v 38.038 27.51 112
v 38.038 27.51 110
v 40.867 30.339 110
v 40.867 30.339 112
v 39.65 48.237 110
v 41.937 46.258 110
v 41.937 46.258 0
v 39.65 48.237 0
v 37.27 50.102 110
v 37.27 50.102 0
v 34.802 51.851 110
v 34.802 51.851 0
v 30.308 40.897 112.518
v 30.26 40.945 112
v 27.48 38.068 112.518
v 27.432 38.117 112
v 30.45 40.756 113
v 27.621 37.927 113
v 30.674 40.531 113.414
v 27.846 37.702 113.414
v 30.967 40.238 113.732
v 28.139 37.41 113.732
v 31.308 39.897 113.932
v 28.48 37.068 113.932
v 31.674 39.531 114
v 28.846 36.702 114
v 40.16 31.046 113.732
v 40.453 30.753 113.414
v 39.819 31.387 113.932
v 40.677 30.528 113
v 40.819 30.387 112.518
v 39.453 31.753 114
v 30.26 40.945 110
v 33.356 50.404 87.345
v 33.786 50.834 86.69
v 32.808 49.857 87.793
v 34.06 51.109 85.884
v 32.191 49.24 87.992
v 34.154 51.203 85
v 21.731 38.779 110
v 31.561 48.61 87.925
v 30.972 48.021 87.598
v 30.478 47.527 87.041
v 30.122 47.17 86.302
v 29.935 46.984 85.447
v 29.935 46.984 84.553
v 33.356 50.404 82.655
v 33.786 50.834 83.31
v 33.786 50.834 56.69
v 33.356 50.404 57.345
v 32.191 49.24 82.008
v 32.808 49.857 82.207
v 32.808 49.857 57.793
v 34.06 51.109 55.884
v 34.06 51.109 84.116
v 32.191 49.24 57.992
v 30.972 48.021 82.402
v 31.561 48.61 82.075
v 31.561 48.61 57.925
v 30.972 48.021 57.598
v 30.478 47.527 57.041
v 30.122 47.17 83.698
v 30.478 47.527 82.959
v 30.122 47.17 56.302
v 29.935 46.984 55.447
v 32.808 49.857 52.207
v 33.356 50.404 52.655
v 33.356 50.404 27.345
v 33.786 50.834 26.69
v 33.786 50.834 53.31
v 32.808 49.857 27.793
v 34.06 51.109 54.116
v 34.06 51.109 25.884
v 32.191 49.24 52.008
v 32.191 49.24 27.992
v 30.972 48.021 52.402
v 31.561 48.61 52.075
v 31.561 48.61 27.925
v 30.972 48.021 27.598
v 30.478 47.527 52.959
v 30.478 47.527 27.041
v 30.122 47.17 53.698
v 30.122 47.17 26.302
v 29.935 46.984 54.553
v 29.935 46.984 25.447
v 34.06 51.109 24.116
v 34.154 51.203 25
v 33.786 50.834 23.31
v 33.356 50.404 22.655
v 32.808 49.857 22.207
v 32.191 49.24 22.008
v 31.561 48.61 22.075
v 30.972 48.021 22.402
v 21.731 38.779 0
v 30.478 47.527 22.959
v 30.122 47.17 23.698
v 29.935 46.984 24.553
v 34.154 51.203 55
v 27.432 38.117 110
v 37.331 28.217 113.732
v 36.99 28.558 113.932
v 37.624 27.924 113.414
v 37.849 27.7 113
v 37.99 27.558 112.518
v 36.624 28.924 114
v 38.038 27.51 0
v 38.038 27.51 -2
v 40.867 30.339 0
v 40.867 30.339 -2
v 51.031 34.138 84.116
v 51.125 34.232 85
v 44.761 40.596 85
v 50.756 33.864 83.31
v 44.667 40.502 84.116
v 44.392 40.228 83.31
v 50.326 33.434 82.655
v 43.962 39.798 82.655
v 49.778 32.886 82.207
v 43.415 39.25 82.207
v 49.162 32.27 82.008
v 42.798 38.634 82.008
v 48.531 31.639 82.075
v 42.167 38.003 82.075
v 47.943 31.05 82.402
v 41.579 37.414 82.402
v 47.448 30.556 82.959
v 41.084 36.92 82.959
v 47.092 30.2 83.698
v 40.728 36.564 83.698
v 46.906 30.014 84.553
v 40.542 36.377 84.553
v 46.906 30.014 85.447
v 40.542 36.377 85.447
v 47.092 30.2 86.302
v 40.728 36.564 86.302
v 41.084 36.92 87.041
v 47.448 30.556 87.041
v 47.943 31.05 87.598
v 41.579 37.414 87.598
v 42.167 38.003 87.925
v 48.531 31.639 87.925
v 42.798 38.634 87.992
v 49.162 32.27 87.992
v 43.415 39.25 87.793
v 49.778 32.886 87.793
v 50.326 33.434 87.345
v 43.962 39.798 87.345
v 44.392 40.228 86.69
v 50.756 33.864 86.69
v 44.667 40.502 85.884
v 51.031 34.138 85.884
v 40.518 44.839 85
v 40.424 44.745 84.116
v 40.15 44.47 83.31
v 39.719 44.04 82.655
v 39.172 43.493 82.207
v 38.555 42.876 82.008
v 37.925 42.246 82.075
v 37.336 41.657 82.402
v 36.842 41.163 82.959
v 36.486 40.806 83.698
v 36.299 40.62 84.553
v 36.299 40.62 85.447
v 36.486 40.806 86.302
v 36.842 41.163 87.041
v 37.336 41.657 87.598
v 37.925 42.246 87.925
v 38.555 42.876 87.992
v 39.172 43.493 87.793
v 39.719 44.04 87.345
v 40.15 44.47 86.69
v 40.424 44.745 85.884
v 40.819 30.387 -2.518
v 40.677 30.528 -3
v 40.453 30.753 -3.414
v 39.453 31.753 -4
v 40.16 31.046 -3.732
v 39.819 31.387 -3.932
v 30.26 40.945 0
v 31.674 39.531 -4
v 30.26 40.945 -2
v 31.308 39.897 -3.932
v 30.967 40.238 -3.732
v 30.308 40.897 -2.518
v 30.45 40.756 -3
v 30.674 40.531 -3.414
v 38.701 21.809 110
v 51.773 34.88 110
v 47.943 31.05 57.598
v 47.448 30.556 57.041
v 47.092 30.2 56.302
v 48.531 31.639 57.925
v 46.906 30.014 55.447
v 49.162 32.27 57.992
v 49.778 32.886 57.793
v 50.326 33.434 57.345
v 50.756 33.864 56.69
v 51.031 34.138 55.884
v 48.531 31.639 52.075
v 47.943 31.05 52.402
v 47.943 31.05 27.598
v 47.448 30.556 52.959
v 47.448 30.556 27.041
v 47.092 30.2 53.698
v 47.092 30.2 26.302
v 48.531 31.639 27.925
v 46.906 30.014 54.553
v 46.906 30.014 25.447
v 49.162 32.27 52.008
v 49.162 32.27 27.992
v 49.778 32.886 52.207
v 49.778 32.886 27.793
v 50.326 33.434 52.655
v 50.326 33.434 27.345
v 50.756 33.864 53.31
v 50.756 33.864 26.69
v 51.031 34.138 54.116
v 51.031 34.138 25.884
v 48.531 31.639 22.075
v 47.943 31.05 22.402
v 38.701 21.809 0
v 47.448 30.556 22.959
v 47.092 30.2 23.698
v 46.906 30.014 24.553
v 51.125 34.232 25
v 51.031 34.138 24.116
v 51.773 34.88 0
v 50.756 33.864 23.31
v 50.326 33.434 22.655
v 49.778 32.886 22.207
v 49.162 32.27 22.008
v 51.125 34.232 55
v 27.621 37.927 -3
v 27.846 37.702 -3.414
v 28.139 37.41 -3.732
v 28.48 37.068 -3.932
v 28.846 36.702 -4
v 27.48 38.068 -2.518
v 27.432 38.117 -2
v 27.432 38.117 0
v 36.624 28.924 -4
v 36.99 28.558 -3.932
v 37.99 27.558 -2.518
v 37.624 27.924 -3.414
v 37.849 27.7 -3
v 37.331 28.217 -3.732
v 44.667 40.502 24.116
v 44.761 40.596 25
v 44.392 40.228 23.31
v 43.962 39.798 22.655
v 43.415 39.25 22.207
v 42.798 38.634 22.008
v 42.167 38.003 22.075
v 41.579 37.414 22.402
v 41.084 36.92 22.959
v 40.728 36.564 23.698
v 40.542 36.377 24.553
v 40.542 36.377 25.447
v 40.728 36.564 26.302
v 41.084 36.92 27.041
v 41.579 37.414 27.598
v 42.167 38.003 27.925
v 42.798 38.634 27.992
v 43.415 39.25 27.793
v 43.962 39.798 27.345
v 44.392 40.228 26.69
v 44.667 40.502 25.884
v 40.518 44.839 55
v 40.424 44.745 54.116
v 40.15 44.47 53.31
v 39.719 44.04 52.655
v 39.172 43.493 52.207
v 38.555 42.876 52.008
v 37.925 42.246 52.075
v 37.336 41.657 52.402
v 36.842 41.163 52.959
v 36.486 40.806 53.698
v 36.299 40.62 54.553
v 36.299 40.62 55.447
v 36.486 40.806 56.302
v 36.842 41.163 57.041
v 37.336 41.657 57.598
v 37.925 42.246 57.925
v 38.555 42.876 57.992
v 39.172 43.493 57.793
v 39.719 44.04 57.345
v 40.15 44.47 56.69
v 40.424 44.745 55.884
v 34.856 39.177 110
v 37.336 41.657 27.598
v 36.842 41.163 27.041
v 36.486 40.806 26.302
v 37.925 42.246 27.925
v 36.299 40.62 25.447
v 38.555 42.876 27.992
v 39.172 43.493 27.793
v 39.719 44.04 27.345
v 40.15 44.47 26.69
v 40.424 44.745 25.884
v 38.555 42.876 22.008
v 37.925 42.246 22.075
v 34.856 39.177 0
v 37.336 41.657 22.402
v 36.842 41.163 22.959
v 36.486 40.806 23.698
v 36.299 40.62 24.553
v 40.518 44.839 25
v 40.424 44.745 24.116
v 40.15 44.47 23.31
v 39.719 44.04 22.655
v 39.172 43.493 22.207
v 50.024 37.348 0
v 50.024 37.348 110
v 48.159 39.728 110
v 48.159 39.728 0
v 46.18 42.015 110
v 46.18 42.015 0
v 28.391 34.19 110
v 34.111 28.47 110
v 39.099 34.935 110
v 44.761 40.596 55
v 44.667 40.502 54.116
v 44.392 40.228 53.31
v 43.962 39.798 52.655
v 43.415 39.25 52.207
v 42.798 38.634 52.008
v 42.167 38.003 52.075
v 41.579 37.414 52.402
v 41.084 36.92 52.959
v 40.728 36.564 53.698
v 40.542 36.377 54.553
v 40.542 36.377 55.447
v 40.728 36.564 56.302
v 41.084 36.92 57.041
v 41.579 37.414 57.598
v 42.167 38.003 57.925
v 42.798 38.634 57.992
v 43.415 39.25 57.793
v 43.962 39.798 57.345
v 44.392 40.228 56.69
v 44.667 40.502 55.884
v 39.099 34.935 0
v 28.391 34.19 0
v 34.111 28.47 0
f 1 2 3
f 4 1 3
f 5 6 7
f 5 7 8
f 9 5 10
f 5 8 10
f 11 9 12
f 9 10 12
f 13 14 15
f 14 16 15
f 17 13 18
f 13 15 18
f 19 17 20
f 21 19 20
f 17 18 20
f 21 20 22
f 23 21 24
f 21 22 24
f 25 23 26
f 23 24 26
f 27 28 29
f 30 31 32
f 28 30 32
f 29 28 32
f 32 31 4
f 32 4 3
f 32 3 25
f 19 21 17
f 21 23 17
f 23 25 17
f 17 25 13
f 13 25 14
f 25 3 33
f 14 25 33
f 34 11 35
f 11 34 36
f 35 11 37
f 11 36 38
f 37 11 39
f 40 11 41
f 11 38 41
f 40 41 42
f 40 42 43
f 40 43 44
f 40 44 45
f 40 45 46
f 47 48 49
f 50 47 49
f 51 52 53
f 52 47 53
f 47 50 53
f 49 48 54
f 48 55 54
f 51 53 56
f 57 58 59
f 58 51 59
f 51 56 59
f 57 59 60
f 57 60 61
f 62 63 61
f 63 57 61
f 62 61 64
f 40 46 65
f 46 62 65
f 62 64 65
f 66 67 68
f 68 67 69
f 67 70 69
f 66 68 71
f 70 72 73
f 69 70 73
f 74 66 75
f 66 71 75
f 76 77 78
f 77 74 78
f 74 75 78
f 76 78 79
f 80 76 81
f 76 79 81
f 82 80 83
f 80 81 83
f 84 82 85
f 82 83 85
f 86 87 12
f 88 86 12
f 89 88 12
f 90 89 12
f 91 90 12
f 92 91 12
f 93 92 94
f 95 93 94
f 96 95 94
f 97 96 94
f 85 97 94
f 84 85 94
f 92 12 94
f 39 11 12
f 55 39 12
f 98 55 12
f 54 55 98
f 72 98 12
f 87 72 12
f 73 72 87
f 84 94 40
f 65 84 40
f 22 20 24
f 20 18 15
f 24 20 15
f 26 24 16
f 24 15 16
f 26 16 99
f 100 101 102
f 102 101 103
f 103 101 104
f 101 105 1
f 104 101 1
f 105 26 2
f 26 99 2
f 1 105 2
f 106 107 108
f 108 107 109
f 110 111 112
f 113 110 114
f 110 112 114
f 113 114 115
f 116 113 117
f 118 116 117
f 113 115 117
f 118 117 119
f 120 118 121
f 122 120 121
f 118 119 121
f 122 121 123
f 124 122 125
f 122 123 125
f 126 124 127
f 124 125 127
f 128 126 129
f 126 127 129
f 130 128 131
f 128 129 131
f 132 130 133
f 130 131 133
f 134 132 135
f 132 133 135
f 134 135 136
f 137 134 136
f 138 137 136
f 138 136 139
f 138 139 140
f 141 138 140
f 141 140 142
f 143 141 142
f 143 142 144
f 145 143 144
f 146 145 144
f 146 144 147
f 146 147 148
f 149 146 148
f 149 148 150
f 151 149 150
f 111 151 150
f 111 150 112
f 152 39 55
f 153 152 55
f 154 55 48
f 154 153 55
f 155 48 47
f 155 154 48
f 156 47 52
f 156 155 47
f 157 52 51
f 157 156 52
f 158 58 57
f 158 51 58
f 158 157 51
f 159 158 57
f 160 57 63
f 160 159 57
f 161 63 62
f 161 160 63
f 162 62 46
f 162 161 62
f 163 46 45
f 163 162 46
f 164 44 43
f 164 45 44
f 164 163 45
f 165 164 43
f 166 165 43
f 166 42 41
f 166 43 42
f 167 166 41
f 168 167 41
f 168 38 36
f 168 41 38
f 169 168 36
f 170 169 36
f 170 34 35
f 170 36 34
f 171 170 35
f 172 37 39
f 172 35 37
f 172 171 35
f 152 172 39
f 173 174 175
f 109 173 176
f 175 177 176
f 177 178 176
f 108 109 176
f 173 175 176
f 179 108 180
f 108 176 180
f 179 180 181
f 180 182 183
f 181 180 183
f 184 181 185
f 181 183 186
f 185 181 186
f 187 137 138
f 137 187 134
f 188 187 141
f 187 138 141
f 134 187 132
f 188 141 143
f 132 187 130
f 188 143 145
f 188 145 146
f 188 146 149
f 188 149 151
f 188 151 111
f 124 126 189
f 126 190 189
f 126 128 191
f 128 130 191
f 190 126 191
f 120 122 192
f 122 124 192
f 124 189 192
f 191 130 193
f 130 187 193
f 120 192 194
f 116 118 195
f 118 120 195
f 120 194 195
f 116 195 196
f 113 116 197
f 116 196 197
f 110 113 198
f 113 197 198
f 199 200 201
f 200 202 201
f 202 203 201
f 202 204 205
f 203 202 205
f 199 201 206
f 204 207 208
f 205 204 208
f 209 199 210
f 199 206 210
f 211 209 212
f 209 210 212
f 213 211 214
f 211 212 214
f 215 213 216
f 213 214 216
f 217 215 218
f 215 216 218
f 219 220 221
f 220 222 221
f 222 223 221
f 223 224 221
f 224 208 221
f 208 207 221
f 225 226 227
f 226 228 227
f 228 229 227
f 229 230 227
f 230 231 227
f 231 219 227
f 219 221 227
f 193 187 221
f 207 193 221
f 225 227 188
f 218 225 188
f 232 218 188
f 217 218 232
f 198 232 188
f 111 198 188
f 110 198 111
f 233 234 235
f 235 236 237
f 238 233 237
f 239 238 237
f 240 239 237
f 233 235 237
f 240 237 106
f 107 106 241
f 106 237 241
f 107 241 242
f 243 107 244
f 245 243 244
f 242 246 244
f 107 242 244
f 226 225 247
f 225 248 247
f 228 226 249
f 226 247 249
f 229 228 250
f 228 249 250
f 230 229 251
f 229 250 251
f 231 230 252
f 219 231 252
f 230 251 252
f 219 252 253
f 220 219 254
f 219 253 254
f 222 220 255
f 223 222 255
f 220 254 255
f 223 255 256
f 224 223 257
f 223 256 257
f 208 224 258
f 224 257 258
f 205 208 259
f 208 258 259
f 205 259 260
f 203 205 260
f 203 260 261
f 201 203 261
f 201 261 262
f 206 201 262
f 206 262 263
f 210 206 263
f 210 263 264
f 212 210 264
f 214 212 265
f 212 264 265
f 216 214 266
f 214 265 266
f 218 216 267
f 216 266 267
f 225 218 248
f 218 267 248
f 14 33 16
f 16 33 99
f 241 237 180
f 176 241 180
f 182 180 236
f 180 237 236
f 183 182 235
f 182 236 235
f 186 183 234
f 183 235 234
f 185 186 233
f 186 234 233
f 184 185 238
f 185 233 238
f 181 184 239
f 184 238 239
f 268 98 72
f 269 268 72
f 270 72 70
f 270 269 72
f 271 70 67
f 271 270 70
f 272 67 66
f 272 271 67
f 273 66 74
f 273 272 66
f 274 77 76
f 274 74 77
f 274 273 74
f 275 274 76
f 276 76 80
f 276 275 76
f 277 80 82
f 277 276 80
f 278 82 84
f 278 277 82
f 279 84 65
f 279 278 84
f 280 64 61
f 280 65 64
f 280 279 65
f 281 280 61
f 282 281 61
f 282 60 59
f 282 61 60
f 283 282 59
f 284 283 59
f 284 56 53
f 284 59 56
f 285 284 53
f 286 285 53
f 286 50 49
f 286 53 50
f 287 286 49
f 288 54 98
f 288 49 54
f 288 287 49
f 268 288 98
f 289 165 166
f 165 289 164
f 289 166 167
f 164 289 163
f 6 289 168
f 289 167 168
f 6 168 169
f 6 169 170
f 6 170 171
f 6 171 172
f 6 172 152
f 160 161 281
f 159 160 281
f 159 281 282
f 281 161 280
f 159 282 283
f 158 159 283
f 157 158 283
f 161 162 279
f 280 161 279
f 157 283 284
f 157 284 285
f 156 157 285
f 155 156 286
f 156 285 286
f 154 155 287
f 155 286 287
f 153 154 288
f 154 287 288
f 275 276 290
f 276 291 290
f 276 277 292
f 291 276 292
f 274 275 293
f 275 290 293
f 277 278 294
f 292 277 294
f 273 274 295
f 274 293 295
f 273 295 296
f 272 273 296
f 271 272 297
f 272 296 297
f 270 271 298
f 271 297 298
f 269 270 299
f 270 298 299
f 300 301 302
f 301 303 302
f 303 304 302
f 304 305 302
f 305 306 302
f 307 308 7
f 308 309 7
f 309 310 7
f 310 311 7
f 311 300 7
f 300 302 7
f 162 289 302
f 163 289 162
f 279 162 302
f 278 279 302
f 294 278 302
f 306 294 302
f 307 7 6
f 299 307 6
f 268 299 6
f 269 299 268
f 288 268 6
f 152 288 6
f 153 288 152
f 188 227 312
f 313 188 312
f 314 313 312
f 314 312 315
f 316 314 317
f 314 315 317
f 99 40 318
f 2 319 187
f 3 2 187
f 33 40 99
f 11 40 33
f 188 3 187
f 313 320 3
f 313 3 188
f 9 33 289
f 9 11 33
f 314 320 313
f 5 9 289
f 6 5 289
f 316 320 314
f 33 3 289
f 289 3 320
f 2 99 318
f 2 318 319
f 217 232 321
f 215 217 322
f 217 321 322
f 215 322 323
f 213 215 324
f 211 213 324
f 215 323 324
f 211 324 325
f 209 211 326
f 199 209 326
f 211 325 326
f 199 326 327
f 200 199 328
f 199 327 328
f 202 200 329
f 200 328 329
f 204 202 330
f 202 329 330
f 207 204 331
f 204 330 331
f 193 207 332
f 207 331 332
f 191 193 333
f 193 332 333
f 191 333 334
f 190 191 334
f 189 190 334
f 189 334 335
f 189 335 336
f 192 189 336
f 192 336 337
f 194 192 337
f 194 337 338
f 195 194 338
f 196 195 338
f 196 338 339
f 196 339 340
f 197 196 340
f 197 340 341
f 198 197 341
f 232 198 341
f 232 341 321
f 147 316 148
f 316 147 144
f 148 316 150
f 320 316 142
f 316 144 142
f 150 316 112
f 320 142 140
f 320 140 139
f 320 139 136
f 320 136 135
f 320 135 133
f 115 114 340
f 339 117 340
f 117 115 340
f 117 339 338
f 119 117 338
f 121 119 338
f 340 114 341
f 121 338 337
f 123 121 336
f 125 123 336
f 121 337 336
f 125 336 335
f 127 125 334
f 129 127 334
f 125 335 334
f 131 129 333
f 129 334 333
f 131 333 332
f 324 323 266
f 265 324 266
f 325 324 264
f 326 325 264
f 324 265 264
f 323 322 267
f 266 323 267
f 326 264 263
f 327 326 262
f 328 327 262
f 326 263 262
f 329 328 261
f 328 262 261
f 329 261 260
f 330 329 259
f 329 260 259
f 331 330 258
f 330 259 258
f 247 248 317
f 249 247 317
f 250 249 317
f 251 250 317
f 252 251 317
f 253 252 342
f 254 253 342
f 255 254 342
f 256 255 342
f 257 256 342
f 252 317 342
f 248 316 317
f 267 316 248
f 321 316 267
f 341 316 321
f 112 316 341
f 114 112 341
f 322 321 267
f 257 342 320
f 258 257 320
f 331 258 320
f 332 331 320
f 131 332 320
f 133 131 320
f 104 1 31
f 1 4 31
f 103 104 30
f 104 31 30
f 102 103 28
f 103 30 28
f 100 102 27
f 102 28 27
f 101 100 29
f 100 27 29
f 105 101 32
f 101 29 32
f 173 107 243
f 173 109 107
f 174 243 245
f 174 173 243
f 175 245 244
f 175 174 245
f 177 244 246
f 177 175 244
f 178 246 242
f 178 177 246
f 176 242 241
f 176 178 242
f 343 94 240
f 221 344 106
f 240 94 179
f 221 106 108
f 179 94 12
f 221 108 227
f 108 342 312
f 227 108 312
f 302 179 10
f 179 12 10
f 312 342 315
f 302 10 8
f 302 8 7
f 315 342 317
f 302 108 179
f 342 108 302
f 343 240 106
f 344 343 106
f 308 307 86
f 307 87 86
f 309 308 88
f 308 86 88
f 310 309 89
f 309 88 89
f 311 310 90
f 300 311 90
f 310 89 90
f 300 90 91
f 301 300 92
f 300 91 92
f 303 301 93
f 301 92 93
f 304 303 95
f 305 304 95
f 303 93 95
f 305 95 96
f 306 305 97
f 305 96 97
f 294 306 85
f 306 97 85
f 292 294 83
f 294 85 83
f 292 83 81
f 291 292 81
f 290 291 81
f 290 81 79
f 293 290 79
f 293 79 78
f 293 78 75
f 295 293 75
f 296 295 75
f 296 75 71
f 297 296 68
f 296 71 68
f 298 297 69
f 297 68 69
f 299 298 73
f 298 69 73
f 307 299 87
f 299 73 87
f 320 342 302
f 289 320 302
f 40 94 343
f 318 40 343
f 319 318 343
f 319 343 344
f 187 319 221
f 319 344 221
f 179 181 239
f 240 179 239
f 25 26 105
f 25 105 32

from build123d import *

# Parameters (mm, degrees)
BOSS_EXTRUDE1_DEPTH      = 110
SKETCH2_R                = 3
CUT_EXTRUDE1_DEPTH       = 55
BOSS_EXTRUDE2_DEPTH      = 114
BOSS_EXTRUDE2_DEPTH_BACK = 4
FILLET1_R                = 2


with BuildPart() as part:
    # Sketch1 → Boss-Extrude1 (new body)
    with BuildSketch(Plane.XY):
        with BuildLine():
            ThreePointArc((41.937258351, 46.258124568), (38.471168757, 49.184002684), (34.802002476, 51.850790754))
            Line((34.802002476, 51.850790754), (21.730642096, 38.779430374))
            ThreePointArc((21.730642096, 38.779430374), (31.38159768, 31.459823211), (38.701204844, 21.808867626))
            Line((38.701204844, 21.808867626), (51.772565224, 34.880228006))
            ThreePointArc((51.772565224, 34.880228006), (49.105777153, 38.549394287), (46.179899038, 42.015483881))
            Line((46.179899038, 42.015483881), (39.099113563, 34.934698406))
            Line((39.099113563, 34.934698406), (34.856472876, 39.177339093))
            Line((34.856472876, 39.177339093), (41.937258351, 46.258124568))
        make_face()
    extrude(amount=BOSS_EXTRUDE1_DEPTH)

    # Sketch2 → Cut-Extrude1 (cut, symmetric)
    with BuildSketch(Plane(origin=(2.082207578, -2.082207578, 0), x_dir=(0, 0, 1), z_dir=(-0.7071067811865467, 0.7071067811865485, 0))):
        with Locations((85, 57.356681906)):
            Circle(SKETCH2_R)
        with Locations((55, 57.356681906)):
            Circle(SKETCH2_R)
        with Locations((25, 57.356681906)):
            Circle(SKETCH2_R)
    extrude(amount=CUT_EXTRUDE1_DEPTH, both=True, mode=Mode.SUBTRACT)

    # Sketch1<5> → Boss-Extrude2 (add, two sides: drawn at the far end of the back side and taken through both)
    with BuildSketch(Plane.XY.offset(-BOSS_EXTRUDE2_DEPTH_BACK)):
        Polygon((40.866880516, 30.338504328), (30.260278798, 40.945106046), (27.431851673, 38.116678921), (38.038453391, 27.510077204), align=None)
    extrude(amount=BOSS_EXTRUDE2_DEPTH + BOSS_EXTRUDE2_DEPTH_BACK)

    # Fillet1
    fillet1_edges = [part.edges().sort_by_distance(p)[0] for p in [
        (28.846065236, 39.530892484, 114),
        (39.452666954, 28.924290766, 114),
        (28.846065236, 39.530892484, -4),
        (39.452666954, 28.924290766, -4),
    ]]
    fillet(fillet1_edges, radius=FILLET1_R)


solid = part.part
